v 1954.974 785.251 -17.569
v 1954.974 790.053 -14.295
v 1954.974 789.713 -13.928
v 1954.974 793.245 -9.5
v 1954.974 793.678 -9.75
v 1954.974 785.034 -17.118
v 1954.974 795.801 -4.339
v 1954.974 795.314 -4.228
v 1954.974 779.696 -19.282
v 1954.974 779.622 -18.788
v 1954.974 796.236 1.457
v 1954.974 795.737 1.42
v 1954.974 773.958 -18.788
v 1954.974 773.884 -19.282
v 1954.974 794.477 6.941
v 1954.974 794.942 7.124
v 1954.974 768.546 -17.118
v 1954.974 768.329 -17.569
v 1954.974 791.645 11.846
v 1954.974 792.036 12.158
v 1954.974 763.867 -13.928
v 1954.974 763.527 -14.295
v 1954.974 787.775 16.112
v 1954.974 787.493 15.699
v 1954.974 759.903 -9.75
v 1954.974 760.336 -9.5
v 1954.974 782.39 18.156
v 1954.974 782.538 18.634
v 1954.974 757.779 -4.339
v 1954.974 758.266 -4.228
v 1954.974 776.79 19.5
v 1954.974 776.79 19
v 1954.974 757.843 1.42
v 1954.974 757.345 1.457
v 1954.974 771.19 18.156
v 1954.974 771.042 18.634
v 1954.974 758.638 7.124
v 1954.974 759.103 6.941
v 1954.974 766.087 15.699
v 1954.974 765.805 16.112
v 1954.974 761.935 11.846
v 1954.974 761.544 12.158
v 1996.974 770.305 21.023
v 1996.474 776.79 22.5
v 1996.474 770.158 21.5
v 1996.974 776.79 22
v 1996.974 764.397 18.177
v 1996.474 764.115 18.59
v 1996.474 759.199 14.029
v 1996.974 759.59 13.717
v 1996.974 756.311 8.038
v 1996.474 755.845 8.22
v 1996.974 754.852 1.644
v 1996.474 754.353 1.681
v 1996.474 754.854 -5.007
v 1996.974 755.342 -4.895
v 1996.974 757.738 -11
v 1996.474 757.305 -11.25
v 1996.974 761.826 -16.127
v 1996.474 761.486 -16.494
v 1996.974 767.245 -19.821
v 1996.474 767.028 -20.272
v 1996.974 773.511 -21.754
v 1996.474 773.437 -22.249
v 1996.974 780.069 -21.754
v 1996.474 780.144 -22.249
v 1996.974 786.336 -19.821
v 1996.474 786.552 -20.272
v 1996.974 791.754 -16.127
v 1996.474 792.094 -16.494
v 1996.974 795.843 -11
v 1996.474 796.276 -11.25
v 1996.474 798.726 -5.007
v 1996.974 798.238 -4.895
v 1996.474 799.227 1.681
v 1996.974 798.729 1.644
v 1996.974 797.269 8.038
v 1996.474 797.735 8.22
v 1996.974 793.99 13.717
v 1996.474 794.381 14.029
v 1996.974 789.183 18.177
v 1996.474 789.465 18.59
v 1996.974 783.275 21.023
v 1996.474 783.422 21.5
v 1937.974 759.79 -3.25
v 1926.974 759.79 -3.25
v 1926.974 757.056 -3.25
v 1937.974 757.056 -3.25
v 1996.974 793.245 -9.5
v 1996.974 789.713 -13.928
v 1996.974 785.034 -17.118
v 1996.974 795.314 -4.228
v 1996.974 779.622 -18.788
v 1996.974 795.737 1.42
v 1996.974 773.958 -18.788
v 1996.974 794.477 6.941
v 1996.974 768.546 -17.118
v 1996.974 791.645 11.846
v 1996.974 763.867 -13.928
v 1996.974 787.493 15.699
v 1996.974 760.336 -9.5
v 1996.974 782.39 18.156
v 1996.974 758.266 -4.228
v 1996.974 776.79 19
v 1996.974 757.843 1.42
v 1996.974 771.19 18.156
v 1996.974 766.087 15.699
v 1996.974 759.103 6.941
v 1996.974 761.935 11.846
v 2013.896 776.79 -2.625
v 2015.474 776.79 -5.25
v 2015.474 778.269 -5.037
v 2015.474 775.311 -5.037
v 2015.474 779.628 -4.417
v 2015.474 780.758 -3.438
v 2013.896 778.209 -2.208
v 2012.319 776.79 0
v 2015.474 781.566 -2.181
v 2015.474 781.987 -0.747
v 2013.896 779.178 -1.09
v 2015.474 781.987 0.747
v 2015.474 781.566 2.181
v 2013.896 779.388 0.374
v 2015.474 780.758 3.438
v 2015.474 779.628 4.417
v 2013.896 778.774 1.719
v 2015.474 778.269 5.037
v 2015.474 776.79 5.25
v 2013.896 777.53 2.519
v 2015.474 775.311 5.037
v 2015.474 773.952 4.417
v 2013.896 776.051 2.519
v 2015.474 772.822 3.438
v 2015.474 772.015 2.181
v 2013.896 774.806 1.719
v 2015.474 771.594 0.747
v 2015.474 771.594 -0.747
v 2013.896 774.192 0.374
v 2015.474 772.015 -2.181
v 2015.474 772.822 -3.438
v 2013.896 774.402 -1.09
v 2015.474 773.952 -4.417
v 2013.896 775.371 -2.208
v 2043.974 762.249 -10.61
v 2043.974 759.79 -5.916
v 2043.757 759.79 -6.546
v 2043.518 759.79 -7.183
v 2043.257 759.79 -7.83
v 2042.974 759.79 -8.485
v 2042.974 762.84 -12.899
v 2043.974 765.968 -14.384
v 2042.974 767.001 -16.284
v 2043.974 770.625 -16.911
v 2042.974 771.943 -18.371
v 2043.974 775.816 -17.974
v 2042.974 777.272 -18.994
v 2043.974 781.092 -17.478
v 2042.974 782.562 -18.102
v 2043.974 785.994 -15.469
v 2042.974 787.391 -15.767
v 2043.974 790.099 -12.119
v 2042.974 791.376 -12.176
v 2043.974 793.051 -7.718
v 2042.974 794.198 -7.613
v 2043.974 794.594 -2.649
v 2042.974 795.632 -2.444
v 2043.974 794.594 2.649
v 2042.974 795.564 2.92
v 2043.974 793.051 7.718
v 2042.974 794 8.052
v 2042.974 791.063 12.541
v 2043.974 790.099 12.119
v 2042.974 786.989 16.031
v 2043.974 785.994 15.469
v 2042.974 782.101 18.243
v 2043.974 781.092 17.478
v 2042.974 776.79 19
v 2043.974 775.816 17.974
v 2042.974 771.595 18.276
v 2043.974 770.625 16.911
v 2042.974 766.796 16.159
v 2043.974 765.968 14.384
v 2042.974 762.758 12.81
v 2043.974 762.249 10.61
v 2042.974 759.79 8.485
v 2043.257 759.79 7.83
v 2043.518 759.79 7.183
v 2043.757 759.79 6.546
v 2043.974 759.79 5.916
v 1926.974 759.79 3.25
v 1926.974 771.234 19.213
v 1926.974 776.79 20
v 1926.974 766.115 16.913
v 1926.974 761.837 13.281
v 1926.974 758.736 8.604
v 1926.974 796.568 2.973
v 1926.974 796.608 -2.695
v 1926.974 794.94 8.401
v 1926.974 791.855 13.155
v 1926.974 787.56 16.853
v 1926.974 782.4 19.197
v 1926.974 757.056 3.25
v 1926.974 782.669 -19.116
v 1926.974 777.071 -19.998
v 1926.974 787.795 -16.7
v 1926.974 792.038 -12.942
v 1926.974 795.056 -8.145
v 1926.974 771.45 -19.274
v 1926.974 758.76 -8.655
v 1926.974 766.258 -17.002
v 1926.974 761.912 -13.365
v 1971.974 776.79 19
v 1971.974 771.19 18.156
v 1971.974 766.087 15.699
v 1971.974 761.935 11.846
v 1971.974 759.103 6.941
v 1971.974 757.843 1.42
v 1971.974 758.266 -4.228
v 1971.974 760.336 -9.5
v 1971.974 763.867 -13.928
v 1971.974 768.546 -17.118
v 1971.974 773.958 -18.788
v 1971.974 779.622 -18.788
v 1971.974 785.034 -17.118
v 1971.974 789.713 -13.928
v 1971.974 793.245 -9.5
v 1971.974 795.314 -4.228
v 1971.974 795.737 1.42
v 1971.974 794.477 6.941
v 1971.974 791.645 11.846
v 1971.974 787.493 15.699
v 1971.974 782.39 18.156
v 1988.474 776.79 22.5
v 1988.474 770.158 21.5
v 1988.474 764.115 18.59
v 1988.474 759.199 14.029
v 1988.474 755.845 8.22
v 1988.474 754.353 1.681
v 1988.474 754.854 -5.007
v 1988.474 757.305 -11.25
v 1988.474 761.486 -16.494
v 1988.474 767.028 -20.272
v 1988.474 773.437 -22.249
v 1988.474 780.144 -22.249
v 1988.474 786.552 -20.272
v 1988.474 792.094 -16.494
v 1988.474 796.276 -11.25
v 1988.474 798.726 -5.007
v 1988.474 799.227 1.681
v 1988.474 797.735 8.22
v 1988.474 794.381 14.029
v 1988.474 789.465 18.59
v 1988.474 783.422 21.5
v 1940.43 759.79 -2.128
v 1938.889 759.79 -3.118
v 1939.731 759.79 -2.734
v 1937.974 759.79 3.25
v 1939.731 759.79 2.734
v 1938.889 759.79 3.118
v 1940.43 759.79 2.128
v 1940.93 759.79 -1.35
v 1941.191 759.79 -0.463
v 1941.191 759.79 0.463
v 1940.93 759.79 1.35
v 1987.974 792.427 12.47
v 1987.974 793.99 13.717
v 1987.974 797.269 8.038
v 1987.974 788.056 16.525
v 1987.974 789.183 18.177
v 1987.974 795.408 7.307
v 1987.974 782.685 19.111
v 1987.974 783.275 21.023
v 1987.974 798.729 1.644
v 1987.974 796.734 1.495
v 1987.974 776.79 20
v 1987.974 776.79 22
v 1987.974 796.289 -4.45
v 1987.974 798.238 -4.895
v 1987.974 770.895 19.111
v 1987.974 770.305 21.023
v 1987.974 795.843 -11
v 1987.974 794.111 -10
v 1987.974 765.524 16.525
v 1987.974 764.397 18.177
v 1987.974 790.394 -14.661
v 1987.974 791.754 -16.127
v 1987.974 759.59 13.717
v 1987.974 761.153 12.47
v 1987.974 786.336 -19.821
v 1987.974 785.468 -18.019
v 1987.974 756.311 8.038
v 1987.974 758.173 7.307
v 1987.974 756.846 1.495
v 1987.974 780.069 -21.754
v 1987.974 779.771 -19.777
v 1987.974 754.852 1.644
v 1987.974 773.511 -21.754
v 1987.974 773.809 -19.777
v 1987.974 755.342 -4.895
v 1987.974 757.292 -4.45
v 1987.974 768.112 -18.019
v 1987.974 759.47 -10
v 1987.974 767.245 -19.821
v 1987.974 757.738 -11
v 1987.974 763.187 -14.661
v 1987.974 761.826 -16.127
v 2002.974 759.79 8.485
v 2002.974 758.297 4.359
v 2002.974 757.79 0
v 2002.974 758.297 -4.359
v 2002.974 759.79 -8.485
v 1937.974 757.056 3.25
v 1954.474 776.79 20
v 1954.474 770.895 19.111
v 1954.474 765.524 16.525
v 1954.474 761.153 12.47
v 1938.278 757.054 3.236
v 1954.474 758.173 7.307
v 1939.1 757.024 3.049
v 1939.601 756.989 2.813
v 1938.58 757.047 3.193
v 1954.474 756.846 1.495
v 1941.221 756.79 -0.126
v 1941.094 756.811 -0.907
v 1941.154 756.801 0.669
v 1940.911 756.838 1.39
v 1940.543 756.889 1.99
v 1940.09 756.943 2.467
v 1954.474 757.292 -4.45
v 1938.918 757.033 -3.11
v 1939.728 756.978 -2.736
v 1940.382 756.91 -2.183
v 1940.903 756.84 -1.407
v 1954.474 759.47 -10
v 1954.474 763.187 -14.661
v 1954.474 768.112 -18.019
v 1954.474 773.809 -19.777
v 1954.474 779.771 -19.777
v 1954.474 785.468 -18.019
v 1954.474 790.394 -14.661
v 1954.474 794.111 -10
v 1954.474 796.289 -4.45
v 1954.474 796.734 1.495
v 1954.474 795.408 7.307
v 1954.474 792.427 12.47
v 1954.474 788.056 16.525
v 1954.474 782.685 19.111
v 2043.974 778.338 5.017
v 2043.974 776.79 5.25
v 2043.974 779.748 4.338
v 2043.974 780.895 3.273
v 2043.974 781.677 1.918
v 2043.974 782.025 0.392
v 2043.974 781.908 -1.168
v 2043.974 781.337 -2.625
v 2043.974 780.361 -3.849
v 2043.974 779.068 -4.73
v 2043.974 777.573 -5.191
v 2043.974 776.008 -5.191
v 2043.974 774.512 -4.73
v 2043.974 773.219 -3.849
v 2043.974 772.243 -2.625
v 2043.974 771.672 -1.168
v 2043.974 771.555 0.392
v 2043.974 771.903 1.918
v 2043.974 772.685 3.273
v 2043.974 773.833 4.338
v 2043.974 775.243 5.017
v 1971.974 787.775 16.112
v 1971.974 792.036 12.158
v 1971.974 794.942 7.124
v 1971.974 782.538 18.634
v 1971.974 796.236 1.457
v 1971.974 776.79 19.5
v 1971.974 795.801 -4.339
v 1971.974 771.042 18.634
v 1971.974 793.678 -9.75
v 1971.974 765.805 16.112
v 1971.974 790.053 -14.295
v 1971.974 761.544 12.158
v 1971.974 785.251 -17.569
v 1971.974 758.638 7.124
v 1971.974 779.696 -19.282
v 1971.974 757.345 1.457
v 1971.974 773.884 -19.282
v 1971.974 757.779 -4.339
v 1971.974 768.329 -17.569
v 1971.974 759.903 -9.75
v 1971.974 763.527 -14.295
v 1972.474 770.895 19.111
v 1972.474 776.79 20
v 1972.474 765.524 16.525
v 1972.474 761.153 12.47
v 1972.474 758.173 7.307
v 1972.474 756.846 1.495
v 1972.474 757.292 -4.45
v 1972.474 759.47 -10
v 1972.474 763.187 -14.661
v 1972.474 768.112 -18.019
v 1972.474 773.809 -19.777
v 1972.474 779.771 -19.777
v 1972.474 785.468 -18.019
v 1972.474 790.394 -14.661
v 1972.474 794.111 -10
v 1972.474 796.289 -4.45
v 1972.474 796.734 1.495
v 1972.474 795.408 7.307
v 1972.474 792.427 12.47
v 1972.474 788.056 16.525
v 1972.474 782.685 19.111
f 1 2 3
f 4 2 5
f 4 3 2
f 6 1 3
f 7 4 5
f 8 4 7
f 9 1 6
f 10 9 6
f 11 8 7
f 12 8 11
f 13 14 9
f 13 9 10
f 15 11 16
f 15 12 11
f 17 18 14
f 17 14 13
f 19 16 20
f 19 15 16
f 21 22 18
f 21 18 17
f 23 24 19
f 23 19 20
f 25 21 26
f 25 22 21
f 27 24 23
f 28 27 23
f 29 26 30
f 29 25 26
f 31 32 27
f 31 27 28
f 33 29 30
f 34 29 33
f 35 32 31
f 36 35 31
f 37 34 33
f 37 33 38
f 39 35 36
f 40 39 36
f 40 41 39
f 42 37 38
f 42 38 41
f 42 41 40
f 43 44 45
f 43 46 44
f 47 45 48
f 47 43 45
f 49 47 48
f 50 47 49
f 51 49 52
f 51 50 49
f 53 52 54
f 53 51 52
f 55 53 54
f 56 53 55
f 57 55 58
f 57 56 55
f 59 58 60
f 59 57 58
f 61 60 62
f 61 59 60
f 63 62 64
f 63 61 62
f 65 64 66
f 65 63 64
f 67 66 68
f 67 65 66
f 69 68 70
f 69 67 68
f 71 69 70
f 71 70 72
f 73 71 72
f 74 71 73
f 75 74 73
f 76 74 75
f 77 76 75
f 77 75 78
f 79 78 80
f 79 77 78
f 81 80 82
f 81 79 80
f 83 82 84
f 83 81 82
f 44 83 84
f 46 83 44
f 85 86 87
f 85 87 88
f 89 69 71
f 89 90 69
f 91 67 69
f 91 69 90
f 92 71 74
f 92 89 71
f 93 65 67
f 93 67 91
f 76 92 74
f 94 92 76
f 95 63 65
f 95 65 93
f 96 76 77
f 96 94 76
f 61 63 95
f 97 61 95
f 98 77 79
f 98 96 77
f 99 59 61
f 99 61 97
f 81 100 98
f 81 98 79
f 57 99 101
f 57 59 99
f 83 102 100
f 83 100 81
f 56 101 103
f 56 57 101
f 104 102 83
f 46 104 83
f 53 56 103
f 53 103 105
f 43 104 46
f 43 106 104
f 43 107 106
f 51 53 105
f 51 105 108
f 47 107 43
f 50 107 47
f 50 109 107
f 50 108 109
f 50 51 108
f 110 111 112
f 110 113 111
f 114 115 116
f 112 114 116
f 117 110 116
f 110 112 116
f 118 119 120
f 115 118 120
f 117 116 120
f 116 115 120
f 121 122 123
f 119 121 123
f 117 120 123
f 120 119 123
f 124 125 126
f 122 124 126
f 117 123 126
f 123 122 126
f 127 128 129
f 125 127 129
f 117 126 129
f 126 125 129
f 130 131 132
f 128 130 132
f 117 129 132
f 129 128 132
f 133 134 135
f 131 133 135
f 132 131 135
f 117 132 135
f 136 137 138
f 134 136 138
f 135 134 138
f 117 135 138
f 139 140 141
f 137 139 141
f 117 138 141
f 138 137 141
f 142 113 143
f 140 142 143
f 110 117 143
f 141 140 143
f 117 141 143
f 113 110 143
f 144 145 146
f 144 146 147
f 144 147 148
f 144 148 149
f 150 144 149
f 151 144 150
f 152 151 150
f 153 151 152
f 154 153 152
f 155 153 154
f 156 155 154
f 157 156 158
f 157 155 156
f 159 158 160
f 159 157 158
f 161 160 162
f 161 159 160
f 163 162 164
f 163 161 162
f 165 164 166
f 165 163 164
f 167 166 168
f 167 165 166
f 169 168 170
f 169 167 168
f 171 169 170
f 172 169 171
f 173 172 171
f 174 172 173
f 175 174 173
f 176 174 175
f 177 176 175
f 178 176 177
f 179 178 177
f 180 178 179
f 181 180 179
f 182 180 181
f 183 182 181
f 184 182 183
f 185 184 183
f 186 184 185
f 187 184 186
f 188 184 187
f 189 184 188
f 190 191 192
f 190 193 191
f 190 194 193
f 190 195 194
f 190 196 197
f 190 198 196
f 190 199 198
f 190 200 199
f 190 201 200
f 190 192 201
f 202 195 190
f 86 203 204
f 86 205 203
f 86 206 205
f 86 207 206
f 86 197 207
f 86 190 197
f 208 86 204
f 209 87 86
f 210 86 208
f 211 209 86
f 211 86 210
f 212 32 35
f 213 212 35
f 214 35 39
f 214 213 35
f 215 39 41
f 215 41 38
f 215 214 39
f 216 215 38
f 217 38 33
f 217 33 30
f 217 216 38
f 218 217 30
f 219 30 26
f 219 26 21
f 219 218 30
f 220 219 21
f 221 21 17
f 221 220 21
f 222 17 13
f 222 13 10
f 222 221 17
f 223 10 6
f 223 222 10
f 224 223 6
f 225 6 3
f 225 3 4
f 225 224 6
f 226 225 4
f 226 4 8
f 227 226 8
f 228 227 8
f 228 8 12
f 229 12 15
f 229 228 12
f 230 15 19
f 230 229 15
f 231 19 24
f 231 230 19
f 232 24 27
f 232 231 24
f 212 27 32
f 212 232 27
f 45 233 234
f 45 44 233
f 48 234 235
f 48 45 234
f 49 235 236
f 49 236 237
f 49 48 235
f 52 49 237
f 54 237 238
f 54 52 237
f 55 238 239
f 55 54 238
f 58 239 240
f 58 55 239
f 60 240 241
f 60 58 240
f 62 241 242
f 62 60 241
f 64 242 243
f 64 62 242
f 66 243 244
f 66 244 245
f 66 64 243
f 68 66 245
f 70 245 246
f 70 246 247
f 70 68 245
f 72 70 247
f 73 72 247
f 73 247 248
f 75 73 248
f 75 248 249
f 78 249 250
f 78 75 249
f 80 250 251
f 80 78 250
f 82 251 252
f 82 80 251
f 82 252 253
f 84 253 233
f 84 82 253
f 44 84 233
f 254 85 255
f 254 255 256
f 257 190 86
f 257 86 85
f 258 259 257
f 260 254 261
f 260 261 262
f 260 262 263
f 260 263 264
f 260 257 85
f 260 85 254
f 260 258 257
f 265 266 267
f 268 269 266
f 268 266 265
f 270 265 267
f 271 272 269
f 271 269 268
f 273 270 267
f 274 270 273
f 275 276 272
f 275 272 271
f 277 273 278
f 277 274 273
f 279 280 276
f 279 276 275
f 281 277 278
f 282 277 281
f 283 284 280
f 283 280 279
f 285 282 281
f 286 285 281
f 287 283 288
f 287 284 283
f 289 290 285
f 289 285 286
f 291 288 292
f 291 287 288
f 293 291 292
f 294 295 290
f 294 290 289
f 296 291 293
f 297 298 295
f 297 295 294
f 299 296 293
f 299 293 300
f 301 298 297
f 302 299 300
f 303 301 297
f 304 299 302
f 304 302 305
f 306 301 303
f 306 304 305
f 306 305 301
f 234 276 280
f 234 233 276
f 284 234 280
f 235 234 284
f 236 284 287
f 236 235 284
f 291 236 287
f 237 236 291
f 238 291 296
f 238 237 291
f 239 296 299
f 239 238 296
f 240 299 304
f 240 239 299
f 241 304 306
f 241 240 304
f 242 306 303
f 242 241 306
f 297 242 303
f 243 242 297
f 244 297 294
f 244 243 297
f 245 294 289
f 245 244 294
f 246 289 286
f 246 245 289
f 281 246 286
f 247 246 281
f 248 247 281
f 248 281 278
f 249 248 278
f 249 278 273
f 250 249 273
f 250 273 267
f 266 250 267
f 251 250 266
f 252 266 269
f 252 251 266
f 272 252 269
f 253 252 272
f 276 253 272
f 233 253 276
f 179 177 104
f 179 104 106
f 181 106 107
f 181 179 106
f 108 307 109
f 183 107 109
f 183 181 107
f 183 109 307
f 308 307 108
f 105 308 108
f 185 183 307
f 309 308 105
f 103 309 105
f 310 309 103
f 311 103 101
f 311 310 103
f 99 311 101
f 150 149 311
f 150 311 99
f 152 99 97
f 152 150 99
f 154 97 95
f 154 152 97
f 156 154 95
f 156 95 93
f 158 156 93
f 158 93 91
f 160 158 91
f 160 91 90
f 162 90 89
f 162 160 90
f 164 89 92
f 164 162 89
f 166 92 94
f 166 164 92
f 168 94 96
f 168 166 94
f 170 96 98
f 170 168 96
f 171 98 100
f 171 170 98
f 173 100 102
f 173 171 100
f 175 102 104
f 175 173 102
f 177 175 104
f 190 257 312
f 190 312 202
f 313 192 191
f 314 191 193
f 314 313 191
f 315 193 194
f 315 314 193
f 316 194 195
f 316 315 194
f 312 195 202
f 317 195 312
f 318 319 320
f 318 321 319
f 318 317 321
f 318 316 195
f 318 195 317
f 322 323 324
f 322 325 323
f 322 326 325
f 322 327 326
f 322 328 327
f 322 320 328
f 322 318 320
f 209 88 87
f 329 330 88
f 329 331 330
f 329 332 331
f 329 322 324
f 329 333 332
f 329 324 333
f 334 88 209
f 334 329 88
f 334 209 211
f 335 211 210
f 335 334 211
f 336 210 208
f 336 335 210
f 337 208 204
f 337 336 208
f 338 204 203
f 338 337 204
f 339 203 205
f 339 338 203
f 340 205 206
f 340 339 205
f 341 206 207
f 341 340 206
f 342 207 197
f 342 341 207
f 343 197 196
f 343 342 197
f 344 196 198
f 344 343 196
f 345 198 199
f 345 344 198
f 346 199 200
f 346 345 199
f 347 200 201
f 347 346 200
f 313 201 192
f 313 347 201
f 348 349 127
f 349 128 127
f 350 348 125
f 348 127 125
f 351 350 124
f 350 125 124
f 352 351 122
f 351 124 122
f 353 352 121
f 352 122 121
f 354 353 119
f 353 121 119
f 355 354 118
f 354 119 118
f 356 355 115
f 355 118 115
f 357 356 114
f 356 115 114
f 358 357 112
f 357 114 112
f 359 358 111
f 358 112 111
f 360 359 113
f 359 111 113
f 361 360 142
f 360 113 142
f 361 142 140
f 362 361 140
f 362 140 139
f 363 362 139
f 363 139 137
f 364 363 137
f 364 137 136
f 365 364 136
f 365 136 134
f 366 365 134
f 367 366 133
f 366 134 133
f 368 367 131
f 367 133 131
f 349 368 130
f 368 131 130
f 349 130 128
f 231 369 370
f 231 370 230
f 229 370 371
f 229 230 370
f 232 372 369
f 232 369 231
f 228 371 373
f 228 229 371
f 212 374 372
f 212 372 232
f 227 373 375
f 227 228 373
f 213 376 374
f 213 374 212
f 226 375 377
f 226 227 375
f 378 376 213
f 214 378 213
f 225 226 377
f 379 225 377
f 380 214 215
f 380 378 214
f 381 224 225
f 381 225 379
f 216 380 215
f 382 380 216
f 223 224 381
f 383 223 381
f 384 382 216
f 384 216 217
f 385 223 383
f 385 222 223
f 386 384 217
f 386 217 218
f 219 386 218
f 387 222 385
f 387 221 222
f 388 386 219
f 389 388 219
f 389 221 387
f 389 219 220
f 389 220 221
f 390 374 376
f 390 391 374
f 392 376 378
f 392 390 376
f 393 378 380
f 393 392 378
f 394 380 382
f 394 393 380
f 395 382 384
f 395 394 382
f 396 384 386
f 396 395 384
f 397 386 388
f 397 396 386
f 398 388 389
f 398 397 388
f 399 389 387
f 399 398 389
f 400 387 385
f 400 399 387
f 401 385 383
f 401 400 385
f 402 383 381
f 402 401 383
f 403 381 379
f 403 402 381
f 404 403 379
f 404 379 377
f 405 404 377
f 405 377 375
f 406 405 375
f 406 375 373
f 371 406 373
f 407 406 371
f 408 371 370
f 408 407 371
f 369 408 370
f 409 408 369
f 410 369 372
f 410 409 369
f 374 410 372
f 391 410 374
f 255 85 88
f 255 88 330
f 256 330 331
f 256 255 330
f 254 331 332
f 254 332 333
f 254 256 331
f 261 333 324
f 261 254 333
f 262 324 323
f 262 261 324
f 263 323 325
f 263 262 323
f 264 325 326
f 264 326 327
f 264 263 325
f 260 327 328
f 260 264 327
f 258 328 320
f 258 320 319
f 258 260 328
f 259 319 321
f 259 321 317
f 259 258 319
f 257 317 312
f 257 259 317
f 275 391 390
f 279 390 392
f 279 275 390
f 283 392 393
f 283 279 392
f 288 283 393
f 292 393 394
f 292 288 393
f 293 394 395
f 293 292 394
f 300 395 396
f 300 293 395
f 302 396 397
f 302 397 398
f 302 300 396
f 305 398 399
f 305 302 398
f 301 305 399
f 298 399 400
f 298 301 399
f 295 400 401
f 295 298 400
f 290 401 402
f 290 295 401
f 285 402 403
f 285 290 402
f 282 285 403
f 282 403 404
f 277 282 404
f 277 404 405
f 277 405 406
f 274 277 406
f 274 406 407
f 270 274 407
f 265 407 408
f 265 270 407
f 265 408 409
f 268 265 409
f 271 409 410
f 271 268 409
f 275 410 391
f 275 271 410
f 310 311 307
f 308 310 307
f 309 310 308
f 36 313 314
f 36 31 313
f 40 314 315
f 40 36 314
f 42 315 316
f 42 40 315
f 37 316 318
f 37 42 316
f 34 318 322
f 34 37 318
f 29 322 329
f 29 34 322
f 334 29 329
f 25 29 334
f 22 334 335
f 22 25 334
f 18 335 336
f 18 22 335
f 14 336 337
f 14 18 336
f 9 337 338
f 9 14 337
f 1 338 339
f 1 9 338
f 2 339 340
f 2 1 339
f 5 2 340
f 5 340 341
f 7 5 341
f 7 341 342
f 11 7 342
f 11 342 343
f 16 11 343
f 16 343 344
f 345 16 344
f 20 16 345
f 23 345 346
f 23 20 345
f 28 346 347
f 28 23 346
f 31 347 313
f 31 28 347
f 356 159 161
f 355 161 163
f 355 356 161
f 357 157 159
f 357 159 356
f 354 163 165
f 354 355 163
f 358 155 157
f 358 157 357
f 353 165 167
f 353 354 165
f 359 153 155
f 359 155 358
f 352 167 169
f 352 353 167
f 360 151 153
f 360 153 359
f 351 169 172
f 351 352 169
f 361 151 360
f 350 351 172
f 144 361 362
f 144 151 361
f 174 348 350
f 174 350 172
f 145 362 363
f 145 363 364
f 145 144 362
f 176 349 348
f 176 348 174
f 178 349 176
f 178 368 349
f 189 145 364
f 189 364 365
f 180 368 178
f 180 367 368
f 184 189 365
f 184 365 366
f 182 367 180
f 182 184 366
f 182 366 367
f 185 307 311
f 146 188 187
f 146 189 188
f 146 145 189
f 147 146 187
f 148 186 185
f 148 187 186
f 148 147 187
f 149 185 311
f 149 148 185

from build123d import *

# Parameters (mm, degrees)
CUT_EXTRUDE_1_DEPTH = 41
M12X1_5_1_D         = 10.5
M12X1_5_1_DEPTH     = 28.5
M12X1_5_1_TIP       = 3.15451825
CUT_EXTRUDE_2_DEPTH = 5


with BuildPart() as part:
    # 草图1 → 旋转1 (revolve)
    with BuildSketch(Plane.XY, mode=Mode.PRIVATE) as revolve_1_sk:
        Polygon((2043.973648654, 794.790077636), (2043.973648654, 776.790077638), (1926.973648645, 776.790077638), (1926.973648645, 796.790077638), (1954.473648645, 796.790077638), (1954.973648645, 796.290077638), (1954.973648645, 795.790077638), (1971.973648645, 795.790077638), (1971.973648645, 796.290077636), (1972.473648645, 796.790077636), (1987.973648648, 796.790077636), (1987.973648648, 798.790077633), (1988.47364865, 799.290077636), (1996.47364865, 799.290077636), (1996.973648654, 798.790077632), (1996.973648654, 795.790077636), (2042.973648654, 795.790077636), align=None)
    revolve(revolve_1_sk.sketch.rotate(Axis((1926.973648645, 776.790077638, 0), (1, 0, 0)), 90), axis=Axis((1926.973648645, 776.790077638, 0), (1, 0, 0)))

    # 草图5 → 切除-拉伸1 (cut)
    with BuildSketch(Plane(origin=(2043.973648654, 0, 0), x_dir=(0, 0, -1), z_dir=(1, 0, 0))):
        with BuildLine():
            Line((-8.485281368, 759.790077638), (8.485281368, 759.790077638))
            ThreePointArc((8.485281368, 759.790077638), (0, 757.790077641), (-8.485281368, 759.790077638))
        make_face()
    extrude(amount=-CUT_EXTRUDE_1_DEPTH, mode=Mode.SUBTRACT)

    # M12x1.5 螺纹孔1
    with Locations(Plane(origin=(2043.973648654, 16.946016644, 3.006019144), x_dir=(0, 0, -1), z_dir=(1, 0, 0))):
        with Locations((3.006019144, 759.844060994)):
            Hole(M12X1_5_1_D / 2, depth=M12X1_5_1_DEPTH)
            with Locations((0, 0, -(M12X1_5_1_DEPTH + M12X1_5_1_TIP / 2))):  # 118° drill point
                Cone(0, M12X1_5_1_D / 2, M12X1_5_1_TIP, mode=Mode.SUBTRACT)

    # 草图8 → 切除-拉伸2 (cut)
    with BuildSketch(Plane.XZ.offset(-759.790077638)):
        with BuildLine():
            Line((1937.973648645, 3.25), (1926.973648645, 3.25))
            Line((1926.973648645, 3.25), (1926.973648645, -3.25))
            Line((1926.973648645, -3.25), (1937.973648645, -3.25))
            ThreePointArc((1937.973648645, -3.25), (1941.223648645, 0), (1937.973648645, 3.25))
        make_face()
    extrude(amount=CUT_EXTRUDE_2_DEPTH, mode=Mode.SUBTRACT)


solid = part.part
